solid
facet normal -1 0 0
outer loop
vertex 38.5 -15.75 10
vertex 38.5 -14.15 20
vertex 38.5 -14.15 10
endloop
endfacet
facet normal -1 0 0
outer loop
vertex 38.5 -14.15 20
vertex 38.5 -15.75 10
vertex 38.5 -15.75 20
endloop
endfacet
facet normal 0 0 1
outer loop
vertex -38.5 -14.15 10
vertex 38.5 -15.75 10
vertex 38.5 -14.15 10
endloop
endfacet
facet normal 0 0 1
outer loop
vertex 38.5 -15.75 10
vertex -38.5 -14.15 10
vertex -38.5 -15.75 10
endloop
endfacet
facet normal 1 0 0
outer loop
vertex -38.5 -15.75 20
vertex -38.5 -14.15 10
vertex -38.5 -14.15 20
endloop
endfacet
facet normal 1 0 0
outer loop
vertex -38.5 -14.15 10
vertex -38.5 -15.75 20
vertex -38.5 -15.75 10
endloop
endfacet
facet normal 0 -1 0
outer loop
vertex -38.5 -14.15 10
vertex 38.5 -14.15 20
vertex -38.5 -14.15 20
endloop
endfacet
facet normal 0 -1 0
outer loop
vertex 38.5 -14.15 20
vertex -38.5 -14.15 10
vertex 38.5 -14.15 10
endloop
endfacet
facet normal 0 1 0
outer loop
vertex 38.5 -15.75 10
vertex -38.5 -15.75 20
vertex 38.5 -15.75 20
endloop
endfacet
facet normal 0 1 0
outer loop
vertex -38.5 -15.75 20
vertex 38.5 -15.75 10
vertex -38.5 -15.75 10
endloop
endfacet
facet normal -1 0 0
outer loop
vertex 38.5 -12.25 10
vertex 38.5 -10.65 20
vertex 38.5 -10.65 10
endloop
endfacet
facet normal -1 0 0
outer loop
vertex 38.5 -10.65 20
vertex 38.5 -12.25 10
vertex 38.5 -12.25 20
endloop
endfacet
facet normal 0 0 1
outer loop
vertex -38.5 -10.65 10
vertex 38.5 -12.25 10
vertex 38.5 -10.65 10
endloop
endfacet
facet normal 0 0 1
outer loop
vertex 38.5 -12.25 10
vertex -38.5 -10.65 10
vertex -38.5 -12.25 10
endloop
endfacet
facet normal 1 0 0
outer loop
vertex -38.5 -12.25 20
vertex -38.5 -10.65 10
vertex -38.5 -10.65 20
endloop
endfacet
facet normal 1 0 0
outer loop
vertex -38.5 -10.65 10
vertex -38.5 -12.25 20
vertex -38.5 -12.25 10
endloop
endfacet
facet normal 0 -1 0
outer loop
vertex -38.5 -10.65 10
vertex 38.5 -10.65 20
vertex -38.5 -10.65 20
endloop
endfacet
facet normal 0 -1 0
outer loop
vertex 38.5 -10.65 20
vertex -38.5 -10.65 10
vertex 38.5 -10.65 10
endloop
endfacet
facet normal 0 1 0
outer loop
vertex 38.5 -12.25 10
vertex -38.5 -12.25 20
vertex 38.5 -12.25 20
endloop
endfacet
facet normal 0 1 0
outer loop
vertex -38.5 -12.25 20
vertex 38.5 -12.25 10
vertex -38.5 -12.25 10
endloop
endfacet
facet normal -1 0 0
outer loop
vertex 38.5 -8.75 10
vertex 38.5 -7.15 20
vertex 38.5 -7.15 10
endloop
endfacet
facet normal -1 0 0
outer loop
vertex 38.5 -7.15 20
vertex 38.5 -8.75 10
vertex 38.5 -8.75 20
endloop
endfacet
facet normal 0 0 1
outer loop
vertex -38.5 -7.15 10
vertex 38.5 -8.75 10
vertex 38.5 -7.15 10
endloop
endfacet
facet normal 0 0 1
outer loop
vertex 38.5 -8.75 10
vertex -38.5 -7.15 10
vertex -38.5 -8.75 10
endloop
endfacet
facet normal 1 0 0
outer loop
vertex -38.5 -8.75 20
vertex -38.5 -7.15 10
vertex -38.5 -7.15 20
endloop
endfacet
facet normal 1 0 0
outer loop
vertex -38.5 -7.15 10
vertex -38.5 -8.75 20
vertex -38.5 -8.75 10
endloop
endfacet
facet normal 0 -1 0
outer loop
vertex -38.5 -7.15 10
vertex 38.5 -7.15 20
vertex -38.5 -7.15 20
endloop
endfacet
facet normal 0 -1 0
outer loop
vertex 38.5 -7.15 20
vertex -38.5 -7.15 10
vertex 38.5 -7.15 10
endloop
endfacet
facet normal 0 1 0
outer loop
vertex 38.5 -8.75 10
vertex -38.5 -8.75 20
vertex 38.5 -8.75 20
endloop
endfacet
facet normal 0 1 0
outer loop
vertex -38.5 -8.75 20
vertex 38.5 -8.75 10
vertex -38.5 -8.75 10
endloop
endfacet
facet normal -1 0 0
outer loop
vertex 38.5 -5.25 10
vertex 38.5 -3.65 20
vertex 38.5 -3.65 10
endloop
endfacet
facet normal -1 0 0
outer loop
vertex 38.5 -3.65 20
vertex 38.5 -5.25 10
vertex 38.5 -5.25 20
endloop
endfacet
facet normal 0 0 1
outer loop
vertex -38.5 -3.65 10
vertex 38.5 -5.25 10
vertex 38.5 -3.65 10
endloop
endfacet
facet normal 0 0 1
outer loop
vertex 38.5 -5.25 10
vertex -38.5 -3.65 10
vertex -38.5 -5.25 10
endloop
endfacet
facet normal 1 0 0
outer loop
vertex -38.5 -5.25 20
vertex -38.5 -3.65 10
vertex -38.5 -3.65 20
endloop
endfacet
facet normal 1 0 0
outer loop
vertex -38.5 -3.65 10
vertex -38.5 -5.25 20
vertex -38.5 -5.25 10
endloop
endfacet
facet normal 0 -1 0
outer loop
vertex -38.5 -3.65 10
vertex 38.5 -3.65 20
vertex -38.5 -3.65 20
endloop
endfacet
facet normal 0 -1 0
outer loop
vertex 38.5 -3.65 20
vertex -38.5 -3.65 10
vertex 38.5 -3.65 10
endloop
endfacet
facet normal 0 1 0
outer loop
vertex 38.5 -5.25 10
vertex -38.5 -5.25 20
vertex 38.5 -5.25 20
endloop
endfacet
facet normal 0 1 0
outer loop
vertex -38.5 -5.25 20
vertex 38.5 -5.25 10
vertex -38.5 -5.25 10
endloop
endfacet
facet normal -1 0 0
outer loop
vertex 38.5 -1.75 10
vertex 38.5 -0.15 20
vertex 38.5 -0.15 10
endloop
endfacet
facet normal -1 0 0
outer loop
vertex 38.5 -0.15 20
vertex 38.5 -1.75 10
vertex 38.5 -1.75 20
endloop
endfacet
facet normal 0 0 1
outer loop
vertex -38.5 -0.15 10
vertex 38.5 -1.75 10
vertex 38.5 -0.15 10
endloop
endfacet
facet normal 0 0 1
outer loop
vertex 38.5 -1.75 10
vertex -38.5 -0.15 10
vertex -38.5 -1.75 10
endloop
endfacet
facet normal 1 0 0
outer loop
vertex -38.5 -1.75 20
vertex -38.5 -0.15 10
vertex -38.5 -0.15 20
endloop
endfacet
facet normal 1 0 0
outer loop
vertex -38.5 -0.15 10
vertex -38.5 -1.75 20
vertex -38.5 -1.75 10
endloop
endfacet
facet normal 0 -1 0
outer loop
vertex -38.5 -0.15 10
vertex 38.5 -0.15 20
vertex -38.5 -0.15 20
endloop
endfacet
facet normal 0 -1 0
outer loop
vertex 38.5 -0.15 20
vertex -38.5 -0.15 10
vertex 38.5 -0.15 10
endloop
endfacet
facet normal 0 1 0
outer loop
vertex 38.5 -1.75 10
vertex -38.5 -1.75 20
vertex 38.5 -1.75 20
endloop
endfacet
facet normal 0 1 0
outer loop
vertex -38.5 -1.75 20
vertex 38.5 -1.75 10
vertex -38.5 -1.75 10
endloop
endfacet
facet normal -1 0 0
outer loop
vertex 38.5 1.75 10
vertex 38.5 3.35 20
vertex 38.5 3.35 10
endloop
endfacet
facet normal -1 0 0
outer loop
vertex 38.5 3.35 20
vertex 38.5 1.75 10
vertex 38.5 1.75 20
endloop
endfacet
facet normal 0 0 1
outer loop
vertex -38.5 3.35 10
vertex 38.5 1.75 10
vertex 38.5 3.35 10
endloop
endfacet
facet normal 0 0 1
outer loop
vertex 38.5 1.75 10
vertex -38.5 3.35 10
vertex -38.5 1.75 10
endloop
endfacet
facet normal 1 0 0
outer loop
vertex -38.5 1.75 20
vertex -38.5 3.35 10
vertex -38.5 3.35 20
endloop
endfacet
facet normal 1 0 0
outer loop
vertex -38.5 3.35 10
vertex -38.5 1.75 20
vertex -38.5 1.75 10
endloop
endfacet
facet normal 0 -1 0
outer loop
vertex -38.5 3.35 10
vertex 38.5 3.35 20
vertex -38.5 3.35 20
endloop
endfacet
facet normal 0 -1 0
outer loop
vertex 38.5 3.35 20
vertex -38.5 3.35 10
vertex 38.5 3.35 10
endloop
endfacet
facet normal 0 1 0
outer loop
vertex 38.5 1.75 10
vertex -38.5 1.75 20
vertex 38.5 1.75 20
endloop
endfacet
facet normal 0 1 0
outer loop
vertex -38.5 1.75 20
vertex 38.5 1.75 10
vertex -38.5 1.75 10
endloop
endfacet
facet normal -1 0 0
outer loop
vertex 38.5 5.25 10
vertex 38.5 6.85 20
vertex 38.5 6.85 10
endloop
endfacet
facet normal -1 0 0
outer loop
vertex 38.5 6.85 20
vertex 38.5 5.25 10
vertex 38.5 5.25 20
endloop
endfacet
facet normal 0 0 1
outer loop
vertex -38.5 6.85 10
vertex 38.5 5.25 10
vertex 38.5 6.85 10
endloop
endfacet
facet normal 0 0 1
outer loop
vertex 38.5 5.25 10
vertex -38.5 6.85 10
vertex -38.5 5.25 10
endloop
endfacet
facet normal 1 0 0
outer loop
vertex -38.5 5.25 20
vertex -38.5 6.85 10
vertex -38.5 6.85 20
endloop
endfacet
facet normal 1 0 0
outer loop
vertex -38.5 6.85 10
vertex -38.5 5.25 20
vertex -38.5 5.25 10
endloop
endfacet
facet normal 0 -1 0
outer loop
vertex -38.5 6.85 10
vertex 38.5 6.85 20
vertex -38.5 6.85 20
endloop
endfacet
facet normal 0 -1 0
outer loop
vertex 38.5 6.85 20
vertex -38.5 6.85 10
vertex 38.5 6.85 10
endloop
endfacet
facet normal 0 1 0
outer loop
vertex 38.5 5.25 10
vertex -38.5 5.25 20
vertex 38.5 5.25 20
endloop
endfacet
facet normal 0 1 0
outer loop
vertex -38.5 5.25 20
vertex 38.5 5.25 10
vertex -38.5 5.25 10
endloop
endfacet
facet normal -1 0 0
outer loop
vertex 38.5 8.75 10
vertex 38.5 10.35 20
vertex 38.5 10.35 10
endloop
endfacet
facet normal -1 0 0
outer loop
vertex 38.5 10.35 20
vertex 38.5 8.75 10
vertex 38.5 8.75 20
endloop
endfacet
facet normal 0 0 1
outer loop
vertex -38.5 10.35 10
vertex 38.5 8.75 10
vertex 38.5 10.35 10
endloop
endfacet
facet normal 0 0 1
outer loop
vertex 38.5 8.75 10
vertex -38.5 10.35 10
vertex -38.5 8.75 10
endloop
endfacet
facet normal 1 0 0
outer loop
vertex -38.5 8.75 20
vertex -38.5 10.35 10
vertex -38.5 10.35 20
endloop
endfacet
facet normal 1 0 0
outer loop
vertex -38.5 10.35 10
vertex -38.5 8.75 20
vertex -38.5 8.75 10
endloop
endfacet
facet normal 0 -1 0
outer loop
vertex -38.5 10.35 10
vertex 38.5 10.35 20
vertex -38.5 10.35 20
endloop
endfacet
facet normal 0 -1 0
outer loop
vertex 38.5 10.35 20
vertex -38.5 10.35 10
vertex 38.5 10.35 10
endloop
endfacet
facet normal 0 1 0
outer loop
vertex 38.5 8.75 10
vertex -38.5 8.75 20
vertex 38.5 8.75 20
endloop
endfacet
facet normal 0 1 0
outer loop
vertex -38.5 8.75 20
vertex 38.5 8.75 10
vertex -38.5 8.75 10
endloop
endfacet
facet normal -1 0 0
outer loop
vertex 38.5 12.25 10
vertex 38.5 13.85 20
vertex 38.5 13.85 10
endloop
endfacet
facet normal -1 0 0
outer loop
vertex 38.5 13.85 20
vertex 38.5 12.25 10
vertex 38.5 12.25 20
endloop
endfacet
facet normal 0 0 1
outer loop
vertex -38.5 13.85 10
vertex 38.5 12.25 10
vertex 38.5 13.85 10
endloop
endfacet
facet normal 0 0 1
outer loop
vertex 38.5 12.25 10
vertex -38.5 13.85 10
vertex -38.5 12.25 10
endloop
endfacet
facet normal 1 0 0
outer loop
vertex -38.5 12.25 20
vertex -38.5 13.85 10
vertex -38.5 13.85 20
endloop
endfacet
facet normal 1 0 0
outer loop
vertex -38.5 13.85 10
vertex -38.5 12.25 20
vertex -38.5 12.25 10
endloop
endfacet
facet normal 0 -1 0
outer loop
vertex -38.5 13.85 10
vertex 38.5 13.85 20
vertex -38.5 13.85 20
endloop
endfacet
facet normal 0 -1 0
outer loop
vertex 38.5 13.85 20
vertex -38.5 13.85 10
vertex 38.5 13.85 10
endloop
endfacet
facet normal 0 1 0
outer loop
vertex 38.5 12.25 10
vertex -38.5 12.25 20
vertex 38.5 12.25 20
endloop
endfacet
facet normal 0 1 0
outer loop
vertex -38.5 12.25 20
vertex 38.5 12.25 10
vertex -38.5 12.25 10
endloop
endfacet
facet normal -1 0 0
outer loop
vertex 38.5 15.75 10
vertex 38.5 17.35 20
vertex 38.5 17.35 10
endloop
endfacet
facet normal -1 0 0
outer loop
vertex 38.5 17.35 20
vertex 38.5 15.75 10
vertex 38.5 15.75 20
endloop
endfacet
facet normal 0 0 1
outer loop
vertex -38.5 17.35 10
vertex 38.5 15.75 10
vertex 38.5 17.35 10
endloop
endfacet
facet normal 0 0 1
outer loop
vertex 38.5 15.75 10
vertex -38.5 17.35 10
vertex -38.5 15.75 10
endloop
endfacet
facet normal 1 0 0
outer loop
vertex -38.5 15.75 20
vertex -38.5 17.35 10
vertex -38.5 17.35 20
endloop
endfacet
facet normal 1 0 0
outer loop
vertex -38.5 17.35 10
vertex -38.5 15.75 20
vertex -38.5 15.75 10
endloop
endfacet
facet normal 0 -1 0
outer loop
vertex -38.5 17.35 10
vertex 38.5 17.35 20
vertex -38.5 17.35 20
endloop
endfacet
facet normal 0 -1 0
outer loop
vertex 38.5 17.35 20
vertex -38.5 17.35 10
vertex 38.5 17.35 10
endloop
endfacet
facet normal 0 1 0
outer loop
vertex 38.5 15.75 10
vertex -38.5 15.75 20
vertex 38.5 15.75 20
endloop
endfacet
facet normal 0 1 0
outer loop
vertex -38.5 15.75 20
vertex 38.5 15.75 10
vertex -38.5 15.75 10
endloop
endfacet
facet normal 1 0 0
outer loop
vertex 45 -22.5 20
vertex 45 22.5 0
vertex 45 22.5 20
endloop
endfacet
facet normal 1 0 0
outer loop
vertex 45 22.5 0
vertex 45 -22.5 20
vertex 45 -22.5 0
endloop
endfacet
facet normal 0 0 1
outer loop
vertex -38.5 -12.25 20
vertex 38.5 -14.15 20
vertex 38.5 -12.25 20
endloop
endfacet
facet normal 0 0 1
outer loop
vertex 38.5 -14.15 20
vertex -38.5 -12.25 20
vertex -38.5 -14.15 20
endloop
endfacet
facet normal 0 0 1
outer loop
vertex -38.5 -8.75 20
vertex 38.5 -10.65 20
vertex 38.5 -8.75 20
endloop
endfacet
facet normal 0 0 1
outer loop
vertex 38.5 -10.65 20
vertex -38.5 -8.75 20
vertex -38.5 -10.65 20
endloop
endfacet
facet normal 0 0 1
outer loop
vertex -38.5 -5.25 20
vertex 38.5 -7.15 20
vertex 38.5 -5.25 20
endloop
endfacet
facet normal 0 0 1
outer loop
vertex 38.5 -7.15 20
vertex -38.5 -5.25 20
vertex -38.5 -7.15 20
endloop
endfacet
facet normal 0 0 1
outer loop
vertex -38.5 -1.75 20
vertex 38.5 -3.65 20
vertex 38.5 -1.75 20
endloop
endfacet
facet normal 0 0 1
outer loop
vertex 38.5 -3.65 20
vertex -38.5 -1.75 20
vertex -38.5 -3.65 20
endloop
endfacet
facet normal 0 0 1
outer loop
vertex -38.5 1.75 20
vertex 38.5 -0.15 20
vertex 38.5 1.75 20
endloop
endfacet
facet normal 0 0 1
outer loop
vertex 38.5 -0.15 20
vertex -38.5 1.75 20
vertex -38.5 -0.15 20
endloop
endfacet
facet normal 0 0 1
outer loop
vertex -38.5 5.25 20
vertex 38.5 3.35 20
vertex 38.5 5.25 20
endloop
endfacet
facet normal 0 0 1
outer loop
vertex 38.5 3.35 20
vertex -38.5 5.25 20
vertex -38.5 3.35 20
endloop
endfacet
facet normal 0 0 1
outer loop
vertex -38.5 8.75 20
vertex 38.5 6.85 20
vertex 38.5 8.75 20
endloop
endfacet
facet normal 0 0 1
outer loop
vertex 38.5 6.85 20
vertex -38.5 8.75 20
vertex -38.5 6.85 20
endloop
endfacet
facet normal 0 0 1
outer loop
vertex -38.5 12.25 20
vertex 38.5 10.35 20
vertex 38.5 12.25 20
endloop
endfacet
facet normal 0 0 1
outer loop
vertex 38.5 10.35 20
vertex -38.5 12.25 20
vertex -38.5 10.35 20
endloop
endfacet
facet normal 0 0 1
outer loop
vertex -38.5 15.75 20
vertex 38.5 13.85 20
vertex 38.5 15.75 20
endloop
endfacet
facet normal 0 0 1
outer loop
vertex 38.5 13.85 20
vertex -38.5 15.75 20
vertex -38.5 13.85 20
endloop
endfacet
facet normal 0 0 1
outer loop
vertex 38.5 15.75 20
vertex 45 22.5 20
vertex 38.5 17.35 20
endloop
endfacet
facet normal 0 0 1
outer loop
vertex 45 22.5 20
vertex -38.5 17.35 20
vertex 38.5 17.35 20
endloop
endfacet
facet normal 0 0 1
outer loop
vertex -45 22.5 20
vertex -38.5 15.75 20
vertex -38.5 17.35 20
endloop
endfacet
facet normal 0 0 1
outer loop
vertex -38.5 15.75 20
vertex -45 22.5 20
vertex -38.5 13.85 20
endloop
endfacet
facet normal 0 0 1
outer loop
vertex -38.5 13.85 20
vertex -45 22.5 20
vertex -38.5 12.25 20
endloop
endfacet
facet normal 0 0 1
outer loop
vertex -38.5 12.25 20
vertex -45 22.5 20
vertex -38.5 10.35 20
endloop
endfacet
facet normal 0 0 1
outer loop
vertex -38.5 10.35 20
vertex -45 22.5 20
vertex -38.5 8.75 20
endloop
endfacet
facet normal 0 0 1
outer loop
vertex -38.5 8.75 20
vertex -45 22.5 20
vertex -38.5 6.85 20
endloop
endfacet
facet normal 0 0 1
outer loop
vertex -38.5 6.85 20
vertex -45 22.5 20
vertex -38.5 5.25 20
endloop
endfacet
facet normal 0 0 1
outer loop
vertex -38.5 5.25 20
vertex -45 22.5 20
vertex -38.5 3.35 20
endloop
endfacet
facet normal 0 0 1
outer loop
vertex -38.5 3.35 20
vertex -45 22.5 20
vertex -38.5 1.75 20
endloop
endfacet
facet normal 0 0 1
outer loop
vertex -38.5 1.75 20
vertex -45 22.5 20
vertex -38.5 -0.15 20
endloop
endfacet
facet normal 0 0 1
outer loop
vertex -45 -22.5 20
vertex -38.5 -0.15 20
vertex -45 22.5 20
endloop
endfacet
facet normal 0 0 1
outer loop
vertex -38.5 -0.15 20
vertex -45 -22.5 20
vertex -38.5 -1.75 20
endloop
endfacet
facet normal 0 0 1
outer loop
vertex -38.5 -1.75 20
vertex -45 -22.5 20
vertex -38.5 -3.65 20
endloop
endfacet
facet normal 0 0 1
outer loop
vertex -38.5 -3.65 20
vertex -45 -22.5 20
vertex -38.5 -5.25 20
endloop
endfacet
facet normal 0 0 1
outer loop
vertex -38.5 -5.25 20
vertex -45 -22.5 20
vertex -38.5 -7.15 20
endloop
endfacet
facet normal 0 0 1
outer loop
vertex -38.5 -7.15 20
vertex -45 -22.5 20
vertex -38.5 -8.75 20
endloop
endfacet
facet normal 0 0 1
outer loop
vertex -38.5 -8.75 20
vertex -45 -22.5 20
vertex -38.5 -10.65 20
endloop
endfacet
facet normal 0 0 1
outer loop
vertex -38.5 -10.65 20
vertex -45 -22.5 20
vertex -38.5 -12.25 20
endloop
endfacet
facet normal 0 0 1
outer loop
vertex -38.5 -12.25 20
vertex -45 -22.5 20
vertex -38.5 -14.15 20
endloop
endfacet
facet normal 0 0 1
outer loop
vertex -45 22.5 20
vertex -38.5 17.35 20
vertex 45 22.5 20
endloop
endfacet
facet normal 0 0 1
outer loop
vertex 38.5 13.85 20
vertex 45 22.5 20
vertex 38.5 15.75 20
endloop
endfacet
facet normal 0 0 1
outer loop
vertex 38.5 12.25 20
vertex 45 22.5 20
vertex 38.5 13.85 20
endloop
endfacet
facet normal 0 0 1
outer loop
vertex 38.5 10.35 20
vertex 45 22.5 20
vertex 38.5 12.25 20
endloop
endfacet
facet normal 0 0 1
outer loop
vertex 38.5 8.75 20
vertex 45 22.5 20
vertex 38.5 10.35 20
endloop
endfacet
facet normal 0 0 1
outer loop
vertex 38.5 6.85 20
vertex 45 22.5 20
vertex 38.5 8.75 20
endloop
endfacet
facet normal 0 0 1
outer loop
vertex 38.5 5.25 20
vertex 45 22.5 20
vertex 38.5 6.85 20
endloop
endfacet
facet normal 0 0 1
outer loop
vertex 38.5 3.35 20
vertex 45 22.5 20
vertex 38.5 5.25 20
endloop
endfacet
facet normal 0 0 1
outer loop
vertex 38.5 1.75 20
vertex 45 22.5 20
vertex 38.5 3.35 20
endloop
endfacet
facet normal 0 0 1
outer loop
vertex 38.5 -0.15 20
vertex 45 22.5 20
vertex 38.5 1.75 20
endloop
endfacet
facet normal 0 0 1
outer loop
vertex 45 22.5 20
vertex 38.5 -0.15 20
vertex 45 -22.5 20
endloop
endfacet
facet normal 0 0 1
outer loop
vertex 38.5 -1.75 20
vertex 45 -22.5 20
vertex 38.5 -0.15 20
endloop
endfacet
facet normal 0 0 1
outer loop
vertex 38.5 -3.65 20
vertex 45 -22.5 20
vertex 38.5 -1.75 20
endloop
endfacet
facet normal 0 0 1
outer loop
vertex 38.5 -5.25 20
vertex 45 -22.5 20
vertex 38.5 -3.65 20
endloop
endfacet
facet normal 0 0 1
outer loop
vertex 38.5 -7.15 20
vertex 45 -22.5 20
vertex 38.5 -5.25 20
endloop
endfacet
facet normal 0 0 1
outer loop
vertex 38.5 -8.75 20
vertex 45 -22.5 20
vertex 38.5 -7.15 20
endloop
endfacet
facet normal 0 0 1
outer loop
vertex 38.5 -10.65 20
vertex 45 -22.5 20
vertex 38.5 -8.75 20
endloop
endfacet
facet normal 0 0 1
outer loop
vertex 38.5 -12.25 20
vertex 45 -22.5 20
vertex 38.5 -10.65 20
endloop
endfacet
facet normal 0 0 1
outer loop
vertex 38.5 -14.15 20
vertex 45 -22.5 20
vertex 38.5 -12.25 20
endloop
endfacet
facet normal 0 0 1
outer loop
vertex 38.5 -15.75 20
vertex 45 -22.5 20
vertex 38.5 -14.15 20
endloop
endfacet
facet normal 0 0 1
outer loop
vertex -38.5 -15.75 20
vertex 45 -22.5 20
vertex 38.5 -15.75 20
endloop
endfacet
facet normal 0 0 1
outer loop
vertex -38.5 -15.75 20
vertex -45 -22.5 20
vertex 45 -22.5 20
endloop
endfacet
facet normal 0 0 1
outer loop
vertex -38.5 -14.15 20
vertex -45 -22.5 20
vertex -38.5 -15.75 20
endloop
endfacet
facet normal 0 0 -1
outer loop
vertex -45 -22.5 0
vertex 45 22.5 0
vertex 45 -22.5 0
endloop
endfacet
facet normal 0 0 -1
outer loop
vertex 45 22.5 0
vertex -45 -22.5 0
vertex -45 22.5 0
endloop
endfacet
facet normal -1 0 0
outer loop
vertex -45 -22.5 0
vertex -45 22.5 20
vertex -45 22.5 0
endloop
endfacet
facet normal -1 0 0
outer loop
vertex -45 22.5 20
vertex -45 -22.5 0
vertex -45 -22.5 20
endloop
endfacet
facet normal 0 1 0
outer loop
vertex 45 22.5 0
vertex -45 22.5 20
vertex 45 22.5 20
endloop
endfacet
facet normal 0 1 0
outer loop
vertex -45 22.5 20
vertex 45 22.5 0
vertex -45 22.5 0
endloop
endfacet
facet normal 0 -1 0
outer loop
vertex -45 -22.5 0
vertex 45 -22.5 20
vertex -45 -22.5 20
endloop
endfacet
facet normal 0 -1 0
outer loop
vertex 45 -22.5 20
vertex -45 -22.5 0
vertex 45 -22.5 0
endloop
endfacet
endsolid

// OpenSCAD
// Microscope slide drying rack
// Print orientation: base block on the bed (z = 0), slots open upward.

// ---------------- Parameters ----------------
block_len    = 90;    // base block length along X (mm)
block_wid    = 45;    // base block width along Y (mm)
block_h      = 20;    // base block height along Z (mm)

slot_count   = 10;    // number of slide slots
slot_len     = 77;    // slot length along X (mm)
slot_w       = 1.6;   // slot width along Y (mm)
slot_depth   = 10;    // slot depth into block from top face (mm)
slot_pitch   = 3.5;   // centre-to-centre slot spacing along Y (mm)

eps          = 0.5;   // cutter overshoot past the top face (mm)

$fn = 64;

// ---------------- Model ----------------
difference() {
    // Base block, centred in X and Y, sitting on z = 0
    translate([-block_len / 2, -block_wid / 2, 0])
        cube([block_len, block_wid, block_h]);

    // Parallel slots running along X, centred as a group in X and Y
    for (i = [0 : slot_count - 1]) {
        y = (i - (slot_count - 1) / 2) * slot_pitch;
        translate([-slot_len / 2, y, block_h - slot_depth])
            cube([slot_len, slot_w, slot_depth + eps]);
    }
}
